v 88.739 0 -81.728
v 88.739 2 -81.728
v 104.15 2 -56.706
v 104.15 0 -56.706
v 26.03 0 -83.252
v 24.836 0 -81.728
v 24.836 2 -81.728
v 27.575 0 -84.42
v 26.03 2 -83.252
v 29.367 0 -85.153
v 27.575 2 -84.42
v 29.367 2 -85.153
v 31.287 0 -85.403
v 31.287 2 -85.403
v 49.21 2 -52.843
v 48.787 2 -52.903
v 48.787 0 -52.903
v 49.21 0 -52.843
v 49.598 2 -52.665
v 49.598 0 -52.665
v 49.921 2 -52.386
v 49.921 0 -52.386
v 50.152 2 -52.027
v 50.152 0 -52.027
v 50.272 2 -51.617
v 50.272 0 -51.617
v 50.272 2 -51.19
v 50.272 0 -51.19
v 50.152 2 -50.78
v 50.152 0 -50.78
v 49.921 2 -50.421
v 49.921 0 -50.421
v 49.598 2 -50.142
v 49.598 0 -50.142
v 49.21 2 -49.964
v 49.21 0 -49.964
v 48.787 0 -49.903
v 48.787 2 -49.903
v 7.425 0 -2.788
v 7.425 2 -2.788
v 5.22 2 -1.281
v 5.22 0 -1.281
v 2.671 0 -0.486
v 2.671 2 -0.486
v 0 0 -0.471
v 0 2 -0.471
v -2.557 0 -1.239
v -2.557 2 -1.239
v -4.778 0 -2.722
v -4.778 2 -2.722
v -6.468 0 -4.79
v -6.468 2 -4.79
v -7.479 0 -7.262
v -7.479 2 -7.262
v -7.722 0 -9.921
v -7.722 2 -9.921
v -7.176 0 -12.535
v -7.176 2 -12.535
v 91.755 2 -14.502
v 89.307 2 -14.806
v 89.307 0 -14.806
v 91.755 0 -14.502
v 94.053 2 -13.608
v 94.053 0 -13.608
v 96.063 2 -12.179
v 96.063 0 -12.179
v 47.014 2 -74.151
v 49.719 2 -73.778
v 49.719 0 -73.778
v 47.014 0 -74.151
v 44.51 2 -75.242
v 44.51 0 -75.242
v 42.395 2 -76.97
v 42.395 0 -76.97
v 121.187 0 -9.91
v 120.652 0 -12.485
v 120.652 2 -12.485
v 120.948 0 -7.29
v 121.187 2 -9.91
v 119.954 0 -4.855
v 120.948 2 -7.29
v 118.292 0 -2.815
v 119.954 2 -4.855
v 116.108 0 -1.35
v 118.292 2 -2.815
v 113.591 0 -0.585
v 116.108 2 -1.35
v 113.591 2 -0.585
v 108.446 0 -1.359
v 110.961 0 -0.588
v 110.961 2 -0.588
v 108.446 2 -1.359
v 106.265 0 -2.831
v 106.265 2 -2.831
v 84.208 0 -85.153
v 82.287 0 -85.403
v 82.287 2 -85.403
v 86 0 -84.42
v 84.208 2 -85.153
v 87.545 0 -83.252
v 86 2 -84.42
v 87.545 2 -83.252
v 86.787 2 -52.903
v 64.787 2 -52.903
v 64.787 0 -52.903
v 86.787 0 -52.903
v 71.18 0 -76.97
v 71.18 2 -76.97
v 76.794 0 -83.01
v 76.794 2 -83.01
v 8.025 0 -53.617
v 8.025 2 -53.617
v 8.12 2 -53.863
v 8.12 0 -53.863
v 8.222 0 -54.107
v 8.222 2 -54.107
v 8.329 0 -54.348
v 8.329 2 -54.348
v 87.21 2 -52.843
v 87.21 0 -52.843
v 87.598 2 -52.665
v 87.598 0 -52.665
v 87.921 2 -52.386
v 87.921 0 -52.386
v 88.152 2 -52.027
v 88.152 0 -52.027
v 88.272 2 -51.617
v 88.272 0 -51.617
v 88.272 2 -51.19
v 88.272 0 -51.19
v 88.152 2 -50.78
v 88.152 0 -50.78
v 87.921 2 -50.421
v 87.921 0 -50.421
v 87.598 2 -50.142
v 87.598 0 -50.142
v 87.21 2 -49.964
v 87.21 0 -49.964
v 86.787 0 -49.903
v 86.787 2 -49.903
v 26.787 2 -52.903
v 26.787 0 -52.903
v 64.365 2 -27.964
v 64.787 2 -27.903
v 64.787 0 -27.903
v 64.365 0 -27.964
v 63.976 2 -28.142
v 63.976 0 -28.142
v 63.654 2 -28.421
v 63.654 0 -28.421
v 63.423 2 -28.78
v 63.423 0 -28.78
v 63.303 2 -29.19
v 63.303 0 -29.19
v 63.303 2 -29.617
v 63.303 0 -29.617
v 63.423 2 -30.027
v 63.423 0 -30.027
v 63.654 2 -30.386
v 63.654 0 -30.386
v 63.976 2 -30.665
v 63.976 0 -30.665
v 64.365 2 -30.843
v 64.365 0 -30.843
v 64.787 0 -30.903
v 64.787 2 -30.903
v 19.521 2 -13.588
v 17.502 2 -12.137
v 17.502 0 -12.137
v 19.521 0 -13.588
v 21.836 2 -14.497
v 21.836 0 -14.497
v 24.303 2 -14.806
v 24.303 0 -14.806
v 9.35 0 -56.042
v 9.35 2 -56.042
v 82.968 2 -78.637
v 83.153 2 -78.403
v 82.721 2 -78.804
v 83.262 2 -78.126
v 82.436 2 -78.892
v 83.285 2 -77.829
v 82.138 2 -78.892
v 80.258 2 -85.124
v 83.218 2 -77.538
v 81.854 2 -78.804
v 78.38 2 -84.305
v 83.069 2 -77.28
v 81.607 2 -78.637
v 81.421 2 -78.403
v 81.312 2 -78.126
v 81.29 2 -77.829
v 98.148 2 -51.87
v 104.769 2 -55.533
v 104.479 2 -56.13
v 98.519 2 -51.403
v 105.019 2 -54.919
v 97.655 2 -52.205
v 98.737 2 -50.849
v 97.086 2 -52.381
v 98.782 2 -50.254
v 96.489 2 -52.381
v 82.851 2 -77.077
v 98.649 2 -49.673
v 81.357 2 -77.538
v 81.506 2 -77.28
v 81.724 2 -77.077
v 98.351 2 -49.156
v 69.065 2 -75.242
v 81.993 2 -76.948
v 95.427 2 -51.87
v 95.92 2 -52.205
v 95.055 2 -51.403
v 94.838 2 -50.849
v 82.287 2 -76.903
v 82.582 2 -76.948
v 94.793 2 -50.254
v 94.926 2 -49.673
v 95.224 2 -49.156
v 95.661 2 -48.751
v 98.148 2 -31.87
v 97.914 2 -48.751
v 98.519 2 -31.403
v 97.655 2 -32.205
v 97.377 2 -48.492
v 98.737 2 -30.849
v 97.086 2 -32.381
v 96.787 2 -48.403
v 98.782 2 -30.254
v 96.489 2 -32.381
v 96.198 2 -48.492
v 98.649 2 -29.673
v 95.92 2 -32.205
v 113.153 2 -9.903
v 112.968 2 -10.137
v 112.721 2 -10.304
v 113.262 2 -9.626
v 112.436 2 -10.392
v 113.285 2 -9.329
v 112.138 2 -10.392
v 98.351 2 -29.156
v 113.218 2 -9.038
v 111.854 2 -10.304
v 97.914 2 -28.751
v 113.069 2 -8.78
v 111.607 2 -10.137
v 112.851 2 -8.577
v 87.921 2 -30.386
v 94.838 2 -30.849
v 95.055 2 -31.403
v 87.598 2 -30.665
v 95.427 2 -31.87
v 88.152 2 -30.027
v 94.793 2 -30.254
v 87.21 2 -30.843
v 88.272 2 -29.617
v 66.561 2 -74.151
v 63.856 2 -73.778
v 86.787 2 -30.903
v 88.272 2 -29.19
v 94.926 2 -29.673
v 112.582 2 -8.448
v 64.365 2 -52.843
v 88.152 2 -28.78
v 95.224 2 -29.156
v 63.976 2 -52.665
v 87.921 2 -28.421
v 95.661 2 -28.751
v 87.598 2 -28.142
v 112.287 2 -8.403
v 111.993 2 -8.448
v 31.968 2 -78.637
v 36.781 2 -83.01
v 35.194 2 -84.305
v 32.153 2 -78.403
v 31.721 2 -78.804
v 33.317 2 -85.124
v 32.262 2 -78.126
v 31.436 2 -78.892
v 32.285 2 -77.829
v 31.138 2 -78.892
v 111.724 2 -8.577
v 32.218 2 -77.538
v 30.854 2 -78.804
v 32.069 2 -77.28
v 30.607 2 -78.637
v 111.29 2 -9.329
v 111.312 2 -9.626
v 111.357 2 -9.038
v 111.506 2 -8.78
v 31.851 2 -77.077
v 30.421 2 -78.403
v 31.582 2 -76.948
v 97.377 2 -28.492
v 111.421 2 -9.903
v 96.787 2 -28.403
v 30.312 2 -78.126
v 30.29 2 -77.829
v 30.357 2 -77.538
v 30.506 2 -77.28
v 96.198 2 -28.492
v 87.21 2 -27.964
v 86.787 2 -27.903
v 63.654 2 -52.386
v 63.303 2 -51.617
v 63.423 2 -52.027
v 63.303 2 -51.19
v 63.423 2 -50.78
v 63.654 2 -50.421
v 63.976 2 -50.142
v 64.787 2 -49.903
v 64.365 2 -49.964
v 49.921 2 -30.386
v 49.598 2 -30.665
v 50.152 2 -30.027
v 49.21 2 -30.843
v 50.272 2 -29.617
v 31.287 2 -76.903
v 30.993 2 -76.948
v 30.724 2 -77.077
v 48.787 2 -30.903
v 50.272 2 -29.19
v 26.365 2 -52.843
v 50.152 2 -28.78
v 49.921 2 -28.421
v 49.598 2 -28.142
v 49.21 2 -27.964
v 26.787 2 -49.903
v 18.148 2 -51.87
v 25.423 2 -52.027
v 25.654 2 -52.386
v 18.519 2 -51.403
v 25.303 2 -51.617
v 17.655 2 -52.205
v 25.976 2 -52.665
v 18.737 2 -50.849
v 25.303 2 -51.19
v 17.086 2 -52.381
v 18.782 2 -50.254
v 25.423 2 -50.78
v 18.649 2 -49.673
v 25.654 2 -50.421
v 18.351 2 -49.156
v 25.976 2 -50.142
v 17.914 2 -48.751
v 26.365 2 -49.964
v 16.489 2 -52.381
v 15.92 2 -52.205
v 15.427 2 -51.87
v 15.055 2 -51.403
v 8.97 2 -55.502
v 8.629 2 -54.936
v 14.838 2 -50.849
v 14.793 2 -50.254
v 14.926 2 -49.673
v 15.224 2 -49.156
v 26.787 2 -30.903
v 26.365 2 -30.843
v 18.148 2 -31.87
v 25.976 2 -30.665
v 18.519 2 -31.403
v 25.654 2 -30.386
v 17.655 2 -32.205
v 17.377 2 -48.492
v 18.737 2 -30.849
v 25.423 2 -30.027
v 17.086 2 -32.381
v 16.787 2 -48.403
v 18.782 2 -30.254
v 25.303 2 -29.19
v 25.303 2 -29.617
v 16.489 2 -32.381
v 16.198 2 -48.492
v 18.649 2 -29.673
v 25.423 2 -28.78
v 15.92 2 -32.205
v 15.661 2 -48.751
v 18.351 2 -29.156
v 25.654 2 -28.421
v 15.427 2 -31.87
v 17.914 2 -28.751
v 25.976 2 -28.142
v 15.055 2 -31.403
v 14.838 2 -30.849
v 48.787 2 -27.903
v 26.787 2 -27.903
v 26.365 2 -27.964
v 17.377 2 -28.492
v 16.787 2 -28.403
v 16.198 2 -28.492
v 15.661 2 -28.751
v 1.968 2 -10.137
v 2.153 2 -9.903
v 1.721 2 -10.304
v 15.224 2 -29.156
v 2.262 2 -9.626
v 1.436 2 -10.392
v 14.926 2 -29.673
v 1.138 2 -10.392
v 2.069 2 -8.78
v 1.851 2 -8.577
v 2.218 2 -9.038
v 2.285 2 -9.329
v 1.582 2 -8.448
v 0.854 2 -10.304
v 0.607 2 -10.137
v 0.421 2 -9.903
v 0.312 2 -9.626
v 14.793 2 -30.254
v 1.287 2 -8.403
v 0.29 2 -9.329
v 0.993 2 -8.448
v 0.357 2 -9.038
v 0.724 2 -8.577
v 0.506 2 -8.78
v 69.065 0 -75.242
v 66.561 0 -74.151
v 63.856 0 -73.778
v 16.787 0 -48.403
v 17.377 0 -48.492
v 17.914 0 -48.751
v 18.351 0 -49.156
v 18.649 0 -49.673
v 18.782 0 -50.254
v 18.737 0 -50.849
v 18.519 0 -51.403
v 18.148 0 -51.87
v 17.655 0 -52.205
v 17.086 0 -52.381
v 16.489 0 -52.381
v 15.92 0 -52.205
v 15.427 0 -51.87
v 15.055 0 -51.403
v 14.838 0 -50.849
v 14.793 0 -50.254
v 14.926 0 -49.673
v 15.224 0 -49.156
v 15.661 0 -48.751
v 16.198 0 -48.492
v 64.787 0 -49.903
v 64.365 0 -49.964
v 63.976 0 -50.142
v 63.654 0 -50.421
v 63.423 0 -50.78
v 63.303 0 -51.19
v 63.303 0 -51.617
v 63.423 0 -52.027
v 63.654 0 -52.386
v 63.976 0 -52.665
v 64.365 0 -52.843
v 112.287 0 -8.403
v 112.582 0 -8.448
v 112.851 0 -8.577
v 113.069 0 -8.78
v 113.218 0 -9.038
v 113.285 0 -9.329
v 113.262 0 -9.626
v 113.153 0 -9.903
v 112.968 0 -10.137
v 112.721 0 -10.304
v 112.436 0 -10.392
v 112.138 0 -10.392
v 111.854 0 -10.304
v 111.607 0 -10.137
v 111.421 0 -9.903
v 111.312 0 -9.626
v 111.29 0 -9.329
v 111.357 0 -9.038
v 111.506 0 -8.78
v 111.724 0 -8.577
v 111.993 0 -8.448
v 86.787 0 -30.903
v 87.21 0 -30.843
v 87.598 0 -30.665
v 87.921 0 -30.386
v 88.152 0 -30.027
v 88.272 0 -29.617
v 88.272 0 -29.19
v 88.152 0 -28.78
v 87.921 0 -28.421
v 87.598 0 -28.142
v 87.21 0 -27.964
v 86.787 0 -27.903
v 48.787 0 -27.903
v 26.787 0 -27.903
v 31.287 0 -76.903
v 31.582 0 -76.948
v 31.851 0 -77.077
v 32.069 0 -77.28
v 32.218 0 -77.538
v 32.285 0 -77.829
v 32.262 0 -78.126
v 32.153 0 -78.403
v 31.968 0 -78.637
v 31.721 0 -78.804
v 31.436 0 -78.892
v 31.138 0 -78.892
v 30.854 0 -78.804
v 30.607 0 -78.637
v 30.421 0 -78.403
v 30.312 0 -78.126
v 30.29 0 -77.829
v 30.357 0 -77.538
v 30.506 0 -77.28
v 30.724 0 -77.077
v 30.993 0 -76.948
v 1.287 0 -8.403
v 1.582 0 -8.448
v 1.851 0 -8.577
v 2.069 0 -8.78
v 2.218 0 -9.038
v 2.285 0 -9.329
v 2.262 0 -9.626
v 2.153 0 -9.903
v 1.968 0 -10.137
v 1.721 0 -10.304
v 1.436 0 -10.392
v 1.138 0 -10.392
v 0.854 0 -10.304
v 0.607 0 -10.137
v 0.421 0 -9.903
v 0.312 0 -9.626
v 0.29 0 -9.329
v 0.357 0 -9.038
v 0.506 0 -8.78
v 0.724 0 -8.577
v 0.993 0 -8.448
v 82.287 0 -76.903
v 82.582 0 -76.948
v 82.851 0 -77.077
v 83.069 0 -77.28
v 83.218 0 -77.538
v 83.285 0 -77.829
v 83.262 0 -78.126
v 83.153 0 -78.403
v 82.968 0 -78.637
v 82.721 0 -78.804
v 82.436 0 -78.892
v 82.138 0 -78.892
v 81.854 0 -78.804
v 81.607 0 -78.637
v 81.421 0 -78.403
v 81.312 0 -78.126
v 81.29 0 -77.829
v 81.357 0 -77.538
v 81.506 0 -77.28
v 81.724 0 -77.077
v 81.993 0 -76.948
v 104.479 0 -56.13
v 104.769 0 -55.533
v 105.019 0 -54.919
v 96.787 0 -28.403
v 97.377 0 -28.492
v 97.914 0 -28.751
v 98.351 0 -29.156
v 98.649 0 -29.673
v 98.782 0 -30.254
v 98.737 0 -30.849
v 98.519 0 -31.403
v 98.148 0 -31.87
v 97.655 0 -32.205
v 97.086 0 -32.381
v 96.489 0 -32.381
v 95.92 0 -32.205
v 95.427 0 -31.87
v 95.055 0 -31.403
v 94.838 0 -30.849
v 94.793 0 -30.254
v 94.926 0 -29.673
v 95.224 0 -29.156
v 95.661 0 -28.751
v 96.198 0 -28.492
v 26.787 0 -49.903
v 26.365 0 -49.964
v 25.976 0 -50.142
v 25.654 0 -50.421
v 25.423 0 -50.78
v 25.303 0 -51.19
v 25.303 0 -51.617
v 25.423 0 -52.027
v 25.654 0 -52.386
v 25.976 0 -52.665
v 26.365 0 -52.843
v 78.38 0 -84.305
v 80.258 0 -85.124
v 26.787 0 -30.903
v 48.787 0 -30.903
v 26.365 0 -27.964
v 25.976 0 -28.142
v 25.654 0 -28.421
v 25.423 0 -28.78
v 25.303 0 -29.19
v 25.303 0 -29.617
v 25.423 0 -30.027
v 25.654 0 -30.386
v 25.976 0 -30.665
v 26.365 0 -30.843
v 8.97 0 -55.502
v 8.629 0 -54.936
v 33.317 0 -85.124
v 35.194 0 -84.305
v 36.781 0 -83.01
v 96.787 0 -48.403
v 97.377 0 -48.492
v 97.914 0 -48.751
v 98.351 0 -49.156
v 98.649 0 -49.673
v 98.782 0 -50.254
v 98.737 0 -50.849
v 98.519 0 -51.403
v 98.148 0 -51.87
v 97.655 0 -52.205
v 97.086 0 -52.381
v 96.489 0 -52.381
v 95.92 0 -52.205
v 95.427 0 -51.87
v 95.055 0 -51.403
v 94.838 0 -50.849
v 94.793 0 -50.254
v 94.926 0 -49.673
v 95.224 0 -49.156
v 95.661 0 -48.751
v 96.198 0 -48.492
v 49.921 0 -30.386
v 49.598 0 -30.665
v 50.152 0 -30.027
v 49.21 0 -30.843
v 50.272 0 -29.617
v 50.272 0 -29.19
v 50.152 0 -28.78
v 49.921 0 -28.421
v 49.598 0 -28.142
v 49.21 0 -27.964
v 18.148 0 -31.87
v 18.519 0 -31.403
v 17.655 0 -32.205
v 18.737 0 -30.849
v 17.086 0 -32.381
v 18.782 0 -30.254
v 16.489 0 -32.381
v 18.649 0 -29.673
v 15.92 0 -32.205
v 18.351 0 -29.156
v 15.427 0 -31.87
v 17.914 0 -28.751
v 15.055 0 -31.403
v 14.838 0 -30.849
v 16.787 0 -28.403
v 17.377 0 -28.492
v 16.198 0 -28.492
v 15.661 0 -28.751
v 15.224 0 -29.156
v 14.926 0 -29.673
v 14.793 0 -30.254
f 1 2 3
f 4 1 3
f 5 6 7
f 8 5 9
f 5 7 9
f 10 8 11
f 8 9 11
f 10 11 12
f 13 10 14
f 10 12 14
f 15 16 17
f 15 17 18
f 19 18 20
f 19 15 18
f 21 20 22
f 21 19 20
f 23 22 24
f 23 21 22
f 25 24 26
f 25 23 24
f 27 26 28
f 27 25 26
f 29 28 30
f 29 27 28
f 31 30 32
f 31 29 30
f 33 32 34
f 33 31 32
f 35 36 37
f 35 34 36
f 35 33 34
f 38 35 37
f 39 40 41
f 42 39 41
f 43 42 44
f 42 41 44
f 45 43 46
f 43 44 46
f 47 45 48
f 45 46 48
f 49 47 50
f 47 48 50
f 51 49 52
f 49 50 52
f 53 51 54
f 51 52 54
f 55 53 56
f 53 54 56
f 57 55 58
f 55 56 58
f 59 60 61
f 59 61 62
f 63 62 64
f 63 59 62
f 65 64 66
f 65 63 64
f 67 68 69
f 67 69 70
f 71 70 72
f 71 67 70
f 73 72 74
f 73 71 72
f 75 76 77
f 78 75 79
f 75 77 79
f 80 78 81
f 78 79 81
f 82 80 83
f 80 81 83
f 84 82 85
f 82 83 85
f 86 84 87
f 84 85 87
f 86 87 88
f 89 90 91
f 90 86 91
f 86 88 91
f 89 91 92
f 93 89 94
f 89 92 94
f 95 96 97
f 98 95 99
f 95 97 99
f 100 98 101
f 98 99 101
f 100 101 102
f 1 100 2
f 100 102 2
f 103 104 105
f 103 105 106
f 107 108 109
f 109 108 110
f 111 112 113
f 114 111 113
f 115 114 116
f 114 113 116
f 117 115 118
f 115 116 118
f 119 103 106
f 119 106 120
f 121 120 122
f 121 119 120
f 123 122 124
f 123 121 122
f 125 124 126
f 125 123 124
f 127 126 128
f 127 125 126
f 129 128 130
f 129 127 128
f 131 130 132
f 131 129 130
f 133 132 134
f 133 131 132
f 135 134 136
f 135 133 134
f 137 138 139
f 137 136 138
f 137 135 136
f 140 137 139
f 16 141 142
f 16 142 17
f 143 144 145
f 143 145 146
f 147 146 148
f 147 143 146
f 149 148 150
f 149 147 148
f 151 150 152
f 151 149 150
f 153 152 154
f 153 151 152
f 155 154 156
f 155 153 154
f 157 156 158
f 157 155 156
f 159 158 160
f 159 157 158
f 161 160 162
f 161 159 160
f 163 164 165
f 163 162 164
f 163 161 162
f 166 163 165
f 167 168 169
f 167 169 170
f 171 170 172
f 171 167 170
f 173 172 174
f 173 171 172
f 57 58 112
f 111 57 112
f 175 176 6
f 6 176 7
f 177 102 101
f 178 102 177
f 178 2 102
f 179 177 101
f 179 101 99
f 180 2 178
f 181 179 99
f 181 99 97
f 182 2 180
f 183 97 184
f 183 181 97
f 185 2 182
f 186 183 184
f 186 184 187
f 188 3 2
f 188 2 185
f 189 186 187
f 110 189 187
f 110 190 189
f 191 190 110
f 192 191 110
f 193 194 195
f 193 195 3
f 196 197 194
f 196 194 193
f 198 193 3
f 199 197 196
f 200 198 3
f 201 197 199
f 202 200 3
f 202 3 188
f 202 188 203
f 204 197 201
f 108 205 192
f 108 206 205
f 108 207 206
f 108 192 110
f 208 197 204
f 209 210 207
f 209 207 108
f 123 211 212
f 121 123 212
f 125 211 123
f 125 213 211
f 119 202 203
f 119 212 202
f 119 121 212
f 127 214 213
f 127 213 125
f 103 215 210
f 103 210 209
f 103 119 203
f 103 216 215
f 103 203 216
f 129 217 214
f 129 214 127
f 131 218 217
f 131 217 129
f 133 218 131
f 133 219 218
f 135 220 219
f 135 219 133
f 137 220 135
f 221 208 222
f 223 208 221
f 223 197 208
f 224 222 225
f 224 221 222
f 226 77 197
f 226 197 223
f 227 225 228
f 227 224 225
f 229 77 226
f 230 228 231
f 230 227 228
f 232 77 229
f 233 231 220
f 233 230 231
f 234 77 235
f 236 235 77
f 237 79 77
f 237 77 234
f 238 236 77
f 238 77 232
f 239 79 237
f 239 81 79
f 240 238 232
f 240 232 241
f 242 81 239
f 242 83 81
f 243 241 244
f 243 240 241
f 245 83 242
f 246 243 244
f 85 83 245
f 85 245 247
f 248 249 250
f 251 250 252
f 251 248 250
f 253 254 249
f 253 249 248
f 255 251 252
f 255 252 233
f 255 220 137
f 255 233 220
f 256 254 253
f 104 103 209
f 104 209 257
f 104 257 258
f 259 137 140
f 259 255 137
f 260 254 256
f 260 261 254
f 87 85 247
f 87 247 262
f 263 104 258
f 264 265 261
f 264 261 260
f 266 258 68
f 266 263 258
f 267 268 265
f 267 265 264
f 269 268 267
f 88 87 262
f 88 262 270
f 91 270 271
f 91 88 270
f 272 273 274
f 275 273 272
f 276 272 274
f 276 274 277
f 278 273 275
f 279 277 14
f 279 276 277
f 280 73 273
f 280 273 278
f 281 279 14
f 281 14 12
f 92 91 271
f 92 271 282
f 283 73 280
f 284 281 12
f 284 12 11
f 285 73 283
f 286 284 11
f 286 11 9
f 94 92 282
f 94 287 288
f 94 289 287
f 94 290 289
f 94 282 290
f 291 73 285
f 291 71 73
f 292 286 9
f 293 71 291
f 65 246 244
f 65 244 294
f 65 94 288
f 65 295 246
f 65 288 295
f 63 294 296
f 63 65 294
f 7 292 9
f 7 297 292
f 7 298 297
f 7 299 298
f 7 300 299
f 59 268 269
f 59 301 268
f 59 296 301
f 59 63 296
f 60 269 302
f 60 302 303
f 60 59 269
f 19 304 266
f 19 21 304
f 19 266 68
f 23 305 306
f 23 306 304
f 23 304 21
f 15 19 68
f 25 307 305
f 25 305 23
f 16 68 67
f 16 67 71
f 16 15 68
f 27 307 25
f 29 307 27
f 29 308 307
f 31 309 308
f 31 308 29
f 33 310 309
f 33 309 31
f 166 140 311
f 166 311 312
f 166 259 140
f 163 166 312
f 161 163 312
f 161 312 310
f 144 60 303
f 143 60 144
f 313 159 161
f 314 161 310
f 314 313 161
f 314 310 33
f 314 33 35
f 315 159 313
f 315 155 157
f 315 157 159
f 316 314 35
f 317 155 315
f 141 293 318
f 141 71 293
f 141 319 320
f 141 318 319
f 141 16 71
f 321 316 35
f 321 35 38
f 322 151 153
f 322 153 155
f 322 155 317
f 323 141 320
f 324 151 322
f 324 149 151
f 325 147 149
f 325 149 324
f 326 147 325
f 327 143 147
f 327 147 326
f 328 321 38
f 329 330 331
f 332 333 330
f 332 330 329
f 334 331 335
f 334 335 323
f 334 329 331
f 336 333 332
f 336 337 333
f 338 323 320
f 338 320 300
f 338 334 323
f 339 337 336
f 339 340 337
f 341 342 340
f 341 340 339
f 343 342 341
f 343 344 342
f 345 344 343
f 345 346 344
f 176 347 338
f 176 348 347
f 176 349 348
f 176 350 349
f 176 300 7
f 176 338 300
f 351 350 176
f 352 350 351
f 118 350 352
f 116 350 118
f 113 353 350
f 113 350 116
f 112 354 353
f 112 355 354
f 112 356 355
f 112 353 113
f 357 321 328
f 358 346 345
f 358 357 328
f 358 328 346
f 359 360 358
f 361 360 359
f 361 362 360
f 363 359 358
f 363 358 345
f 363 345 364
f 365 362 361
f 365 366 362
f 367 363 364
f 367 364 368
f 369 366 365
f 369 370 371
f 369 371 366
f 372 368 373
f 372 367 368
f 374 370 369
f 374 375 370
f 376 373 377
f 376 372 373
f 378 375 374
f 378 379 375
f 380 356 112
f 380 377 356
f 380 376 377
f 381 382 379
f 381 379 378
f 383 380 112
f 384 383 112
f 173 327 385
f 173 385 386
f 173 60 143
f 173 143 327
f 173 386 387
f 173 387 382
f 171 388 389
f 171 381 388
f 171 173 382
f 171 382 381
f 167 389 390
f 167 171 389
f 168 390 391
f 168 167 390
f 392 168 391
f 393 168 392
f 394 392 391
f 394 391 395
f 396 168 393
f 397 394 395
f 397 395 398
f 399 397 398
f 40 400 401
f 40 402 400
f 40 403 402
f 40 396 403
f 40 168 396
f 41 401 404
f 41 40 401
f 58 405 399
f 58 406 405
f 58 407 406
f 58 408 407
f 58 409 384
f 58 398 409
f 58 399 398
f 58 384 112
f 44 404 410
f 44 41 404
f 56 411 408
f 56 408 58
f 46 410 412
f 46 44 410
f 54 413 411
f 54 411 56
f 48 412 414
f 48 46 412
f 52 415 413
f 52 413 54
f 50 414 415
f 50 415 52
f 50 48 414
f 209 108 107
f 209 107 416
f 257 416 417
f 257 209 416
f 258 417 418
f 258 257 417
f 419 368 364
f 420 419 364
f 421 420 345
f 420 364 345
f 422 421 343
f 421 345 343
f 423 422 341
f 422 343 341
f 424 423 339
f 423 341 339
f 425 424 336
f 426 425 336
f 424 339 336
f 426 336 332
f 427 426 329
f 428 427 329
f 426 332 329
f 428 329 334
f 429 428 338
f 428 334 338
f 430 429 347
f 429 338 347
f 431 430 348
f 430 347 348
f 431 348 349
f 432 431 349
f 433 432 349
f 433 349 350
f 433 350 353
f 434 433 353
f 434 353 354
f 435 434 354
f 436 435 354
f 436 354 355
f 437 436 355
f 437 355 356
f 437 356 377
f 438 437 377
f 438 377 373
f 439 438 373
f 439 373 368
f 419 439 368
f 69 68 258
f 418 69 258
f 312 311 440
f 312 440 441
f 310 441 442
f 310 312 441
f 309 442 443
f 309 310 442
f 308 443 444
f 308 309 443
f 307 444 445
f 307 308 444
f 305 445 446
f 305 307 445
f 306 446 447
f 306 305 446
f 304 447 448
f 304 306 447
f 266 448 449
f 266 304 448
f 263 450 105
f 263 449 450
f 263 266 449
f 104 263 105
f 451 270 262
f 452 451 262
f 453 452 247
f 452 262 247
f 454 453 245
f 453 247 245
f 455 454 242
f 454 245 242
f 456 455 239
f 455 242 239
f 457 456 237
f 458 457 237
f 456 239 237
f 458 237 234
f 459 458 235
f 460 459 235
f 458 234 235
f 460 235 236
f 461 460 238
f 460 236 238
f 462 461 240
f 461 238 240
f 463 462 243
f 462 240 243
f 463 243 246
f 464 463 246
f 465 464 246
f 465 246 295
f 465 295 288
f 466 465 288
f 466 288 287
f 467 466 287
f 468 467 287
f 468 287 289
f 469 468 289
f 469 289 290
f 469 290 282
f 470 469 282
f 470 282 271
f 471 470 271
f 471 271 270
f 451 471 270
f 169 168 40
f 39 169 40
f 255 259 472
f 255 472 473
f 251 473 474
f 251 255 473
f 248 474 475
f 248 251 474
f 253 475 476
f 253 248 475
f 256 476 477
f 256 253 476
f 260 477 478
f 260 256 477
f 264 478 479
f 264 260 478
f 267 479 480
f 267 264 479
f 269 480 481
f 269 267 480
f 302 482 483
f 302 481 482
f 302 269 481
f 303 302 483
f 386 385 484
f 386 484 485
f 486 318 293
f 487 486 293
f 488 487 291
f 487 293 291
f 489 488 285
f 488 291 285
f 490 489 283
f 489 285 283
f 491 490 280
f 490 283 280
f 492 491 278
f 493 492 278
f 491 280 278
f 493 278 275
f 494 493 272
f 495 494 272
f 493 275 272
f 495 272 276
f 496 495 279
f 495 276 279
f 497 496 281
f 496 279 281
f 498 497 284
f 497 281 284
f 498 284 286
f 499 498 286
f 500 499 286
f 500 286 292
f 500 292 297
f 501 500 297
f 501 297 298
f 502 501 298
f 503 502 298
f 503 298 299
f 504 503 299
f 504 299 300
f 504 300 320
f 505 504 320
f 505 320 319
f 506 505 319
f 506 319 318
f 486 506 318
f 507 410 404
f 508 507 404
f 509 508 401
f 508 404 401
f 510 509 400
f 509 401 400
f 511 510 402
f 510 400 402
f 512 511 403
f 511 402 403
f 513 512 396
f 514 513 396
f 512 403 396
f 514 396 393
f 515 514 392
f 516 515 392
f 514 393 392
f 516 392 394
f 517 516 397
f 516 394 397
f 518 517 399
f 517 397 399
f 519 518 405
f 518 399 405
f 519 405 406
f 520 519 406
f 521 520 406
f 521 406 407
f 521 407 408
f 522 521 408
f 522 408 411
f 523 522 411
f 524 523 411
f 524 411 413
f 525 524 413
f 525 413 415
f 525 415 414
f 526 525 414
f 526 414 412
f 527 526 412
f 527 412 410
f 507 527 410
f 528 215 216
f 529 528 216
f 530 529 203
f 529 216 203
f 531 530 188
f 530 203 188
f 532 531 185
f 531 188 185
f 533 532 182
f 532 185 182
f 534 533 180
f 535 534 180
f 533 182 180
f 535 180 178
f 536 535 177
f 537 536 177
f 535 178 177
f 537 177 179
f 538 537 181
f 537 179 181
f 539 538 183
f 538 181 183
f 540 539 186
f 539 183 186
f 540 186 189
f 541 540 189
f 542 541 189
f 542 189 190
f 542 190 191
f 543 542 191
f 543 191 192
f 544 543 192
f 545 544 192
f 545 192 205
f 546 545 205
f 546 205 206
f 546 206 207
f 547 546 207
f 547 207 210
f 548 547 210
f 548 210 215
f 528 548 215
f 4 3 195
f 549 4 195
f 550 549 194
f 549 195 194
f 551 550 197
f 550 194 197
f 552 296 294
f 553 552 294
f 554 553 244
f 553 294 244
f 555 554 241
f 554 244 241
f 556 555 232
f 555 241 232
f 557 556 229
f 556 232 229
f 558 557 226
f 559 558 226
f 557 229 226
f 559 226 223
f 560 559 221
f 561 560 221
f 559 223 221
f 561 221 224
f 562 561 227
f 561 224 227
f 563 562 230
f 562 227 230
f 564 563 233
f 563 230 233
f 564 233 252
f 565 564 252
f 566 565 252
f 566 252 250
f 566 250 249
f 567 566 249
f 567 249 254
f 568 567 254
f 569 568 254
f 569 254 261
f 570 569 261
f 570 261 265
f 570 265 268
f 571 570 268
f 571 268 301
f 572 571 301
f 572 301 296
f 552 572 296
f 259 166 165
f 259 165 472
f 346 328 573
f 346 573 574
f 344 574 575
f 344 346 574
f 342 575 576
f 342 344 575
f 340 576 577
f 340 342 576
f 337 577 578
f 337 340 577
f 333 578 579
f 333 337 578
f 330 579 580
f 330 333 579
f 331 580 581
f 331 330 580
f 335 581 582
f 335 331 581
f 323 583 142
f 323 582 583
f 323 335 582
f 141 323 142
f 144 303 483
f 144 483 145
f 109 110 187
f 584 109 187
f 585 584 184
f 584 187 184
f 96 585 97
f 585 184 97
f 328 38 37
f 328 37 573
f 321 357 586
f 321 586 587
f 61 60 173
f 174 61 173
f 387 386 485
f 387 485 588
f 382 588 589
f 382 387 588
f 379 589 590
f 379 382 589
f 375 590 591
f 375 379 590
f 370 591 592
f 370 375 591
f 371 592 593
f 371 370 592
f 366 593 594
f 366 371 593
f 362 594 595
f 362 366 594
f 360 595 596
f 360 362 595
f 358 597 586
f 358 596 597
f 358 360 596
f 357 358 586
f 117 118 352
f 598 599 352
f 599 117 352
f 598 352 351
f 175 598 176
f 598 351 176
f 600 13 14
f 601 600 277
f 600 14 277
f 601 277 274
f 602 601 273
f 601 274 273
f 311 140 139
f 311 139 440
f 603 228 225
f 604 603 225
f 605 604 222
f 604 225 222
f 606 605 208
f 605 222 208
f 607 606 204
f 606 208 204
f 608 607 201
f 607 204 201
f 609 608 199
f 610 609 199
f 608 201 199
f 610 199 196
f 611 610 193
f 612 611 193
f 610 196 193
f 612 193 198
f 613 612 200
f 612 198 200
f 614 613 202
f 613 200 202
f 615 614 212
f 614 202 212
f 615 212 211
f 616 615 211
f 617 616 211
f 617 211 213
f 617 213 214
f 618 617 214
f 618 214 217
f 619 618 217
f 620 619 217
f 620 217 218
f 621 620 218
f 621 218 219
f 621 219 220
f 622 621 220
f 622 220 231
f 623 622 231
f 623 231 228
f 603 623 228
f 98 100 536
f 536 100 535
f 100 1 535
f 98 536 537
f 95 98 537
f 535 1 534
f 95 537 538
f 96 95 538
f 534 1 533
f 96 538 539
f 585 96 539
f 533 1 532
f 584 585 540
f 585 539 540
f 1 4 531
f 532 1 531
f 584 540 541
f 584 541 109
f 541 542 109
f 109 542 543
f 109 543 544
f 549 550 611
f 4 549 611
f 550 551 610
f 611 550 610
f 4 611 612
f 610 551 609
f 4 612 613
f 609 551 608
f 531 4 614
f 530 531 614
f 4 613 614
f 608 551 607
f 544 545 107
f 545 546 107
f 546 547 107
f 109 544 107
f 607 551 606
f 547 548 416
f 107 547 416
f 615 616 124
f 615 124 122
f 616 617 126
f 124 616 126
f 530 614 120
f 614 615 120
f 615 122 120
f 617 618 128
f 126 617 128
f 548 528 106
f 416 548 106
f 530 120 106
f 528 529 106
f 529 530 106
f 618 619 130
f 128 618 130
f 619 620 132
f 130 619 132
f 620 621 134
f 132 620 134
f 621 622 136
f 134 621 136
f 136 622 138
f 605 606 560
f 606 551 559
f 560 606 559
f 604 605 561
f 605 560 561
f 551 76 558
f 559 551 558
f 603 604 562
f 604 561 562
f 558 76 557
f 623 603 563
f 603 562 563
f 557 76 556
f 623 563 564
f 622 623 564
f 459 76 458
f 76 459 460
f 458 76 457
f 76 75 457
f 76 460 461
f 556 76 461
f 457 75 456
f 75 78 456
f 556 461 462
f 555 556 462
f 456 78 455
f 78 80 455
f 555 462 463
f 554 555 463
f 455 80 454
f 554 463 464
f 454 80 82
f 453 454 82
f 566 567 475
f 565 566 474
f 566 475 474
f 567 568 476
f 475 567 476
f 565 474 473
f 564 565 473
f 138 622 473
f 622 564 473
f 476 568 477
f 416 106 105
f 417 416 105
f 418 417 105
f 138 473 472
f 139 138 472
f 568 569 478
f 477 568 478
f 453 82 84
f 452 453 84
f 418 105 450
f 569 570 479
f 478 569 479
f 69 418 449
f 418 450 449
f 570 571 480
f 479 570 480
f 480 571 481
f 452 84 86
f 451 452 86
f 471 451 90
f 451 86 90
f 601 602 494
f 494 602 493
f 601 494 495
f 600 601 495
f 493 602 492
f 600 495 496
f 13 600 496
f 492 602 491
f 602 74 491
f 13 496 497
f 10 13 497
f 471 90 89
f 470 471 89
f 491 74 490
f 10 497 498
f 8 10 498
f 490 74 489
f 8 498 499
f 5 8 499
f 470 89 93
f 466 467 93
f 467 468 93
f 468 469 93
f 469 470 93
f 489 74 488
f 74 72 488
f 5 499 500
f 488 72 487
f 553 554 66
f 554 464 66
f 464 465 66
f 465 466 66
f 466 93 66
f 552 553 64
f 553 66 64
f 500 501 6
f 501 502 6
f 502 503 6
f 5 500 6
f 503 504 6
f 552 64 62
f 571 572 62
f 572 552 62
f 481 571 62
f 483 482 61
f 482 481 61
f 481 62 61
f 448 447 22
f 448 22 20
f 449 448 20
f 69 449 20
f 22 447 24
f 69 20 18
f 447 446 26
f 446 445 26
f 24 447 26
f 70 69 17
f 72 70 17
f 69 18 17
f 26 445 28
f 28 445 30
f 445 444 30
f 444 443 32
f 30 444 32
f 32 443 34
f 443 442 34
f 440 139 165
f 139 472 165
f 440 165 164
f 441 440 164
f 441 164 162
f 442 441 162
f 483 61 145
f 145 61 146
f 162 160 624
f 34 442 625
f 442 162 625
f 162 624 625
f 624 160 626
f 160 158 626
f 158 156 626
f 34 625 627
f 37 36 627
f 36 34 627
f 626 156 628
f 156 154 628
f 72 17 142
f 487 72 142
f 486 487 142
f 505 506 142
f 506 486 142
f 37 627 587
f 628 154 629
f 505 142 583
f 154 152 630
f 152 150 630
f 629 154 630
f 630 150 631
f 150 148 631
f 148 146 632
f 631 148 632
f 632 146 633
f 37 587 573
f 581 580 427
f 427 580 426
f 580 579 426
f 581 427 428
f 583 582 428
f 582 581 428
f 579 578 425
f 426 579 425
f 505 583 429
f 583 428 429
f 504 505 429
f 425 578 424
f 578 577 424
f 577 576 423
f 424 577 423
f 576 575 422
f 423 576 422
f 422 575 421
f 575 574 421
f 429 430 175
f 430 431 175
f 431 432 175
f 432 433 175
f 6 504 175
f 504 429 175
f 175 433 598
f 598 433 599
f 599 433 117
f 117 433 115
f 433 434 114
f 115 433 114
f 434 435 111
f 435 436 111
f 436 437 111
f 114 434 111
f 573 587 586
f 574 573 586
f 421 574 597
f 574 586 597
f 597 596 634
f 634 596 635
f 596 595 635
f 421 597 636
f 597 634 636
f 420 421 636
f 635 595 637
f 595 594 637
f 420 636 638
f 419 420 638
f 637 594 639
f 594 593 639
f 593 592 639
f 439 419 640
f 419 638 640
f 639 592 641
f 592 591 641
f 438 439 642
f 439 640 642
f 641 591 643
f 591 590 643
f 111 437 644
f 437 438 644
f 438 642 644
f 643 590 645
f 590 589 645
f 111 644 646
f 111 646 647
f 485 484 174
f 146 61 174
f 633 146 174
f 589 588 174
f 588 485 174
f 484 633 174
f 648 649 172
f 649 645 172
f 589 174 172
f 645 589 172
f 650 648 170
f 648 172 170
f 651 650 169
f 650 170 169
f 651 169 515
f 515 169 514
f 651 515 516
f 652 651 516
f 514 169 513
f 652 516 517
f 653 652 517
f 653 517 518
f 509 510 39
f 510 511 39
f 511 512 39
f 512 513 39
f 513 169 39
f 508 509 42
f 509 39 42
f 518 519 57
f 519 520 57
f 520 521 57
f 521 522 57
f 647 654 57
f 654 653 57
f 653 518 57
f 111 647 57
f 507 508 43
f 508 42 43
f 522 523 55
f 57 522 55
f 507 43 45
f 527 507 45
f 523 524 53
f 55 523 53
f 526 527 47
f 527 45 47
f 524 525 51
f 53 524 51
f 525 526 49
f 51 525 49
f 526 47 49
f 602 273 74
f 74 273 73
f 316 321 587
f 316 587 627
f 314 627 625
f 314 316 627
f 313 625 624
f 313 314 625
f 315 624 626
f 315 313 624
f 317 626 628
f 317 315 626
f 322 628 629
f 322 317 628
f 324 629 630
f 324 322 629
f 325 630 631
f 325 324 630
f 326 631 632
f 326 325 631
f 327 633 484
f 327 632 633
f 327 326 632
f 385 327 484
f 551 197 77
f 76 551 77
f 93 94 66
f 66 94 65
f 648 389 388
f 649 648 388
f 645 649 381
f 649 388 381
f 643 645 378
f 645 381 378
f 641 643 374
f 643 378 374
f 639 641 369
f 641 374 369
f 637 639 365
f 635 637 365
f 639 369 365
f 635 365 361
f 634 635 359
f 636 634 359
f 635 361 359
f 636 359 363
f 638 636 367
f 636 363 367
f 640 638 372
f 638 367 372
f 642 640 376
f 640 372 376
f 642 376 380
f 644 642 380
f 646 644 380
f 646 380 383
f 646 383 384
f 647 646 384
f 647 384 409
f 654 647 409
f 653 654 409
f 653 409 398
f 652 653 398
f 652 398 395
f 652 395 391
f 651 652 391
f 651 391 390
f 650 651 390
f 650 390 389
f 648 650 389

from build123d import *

# Parameters (mm, degrees)
SKETCH1_W           = 130
SKETCH1_H           = 90
BOSS_EXTRUDE2_DEPTH = 2
SKETCH2_R           = 2
CUT_EXTRUDE1_DEPTH  = 10
CUT_EXTRUDE3_DEPTH  = 10
SKETCH5_R           = 1
CUT_EXTRUDE4_DEPTH  = 10
CUT_EXTRUDE5_DEPTH  = 149.761308663
FILLET1_R           = 10


with BuildPart() as part:
    # Sketch1 → Boss-Extrude2 (new body)
    with BuildSketch(Plane(origin=(0, 0, 0), x_dir=(1, 0, 0), z_dir=(0, 1, 0))):
        with Locations((56.787418592, 40.403463793)):
            Rectangle(SKETCH1_W, SKETCH1_H)
    extrude(amount=BOSS_EXTRUDE2_DEPTH)

    # Sketch2 → Cut-Extrude1 (cut)
    with BuildSketch(Plane(origin=(0, 2, 0), x_dir=(1, 0, 0), z_dir=(0, 1, 0))):
        with Locations(Location((16.787418592, 50.403463793, 0), (0, 0, 270))):
            Circle(SKETCH2_R)
        with Locations(Location((16.787418592, 30.403463793, 0), (0, 0, 270))):
            Circle(SKETCH2_R)
        with Locations(Location((96.787418592, 50.403463793, 0), (0, 0, 270))):
            Circle(SKETCH2_R)
        with Locations(Location((96.787418592, 30.403463793, 0), (0, 0, 270))):
            Circle(SKETCH2_R)
    extrude(amount=-CUT_EXTRUDE1_DEPTH, mode=Mode.SUBTRACT)

    # Sketch4 → Cut-Extrude3 (cut)
    with BuildSketch(Plane(origin=(0, 2, 0), x_dir=(1, 0, 0), z_dir=(0, 1, 0))):
        with BuildLine():
            Line((26.787418592, 52.903463793), (48.787418592, 52.903463793))
            ThreePointArc((48.787418592, 52.903463793), (50.287418592, 51.403463793), (48.787418592, 49.903463793))
            Line((48.787418592, 49.903463793), (26.787418592, 49.903463793))
            ThreePointArc((26.787418592, 49.903463793), (25.287418592, 51.403463793), (26.787418592, 52.903463793))
        make_face()
        with BuildLine():
            Line((26.787418592, 30.903463793), (48.787418592, 30.903463793))
            ThreePointArc((48.787418592, 30.903463793), (50.287418592, 29.403463793), (48.787418592, 27.903463793))
            Line((48.787418592, 27.903463793), (26.787418592, 27.903463793))
            ThreePointArc((26.787418592, 27.903463793), (25.287418592, 29.403463793), (26.787418592, 30.903463793))
        make_face()
        with BuildLine():
            Line((64.787418592, 52.903463793), (86.787418592, 52.903463793))
            ThreePointArc((86.787418592, 52.903463793), (88.287418592, 51.403463793), (86.787418592, 49.903463793))
            Line((86.787418592, 49.903463793), (64.787418592, 49.903463793))
            ThreePointArc((64.787418592, 49.903463793), (63.287418592, 51.403463793), (64.787418592, 52.903463793))
        make_face()
        with BuildLine():
            Line((64.787418592, 30.903463793), (86.787418592, 30.903463793))
            ThreePointArc((86.787418592, 30.903463793), (88.287418592, 29.403463793), (86.787418592, 27.903463793))
            Line((86.787418592, 27.903463793), (64.787418592, 27.903463793))
            ThreePointArc((64.787418592, 27.903463793), (63.287418592, 29.403463793), (64.787418592, 30.903463793))
        make_face()
    extrude(amount=-CUT_EXTRUDE3_DEPTH, mode=Mode.SUBTRACT)

    # Sketch5 → Cut-Extrude4 (cut)
    with BuildSketch(Plane(origin=(0, 2, 0), x_dir=(1, 0, 0), z_dir=(0, 1, 0))):
        with Locations(Location((1.287418592, 9.403463793, 0), (0, 0, 270))):
            Circle(SKETCH5_R)
        with Locations(Location((112.287418592, 9.403463793, 0), (0, 0, 270))):
            Circle(SKETCH5_R)
        with Locations(Location((31.287418592, 77.903463793, 0), (0, 0, 270))):
            Circle(SKETCH5_R)
        with Locations(Location((82.287418592, 77.903463793, 0), (0, 0, 270))):
            Circle(SKETCH5_R)
    extrude(amount=-CUT_EXTRUDE4_DEPTH, mode=Mode.SUBTRACT)

    # Sketch6 → Cut-Extrude5 (cut, through all)
    with BuildSketch(Plane(origin=(0, 2, 0), x_dir=(1, 0, 0), z_dir=(0, 1, 0))):
        with BuildLine():
            Line((31.28741871, 85.403463793), (-8.212581408, 85.403463793))
            Line((-8.212581408, 85.403463793), (-8.212581408, -4.596536207))
            Line((-8.212581408, -4.596536207), (121.787418592, -4.596536207))
            Line((121.787418592, -4.596536207), (121.787418592, 85.403463793))
            Line((121.787418592, 85.403463793), (82.287418592, 85.403463793))
            ThreePointArc((82.287418592, 85.403463793), (86.000200188, 84.420000667), (88.739279438, 81.727531213))
            Line((88.739279438, 81.727531213), (104.673461226, 55.855633786))
            Line((104.673461226, 55.855633786), (120.652052787, 12.485170978))
            ThreePointArc((120.652052787, 12.485170978), (117.254615907, 2.001371169), (106.265325845, 2.830913046))
            Line((106.265325845, 2.830913046), (93.195977552, 14.805689748))
            Line((93.195977552, 14.805689748), (20.378859632, 14.805689748))
            Line((20.378859632, 14.805689748), (7.425097101, 2.787815466))
            ThreePointArc((7.425097103, 2.787815464), (-3.723088928, 1.897951505), (-7.176040156, 12.53519915))
            Line((-7.176040154, 12.53519915), (8.242814409, 54.204377623))
            Line((8.242814409, 54.204377623), (8.329286173, 54.347812353))
            ThreePointArc((8.329286173, 54.347812353), (8.794878375, 55.221885781), (9.350471922, 56.041700557))
            Line((9.350471922, 56.041700557), (24.835557745, 81.727531213))
            ThreePointArc((24.835557746, 81.727531212), (27.574637047, 84.420000696), (31.28741871, 85.403463793))
        make_face()
        with BuildLine():
            Line((82.287418592, 85.403463793), (31.28741871, 85.403463793))
            ThreePointArc((31.28741871, 85.403463793), (34.283566781, 84.779007119), (36.780790962, 83.00962282))
            Line((36.780790963, 83.009622821), (45.361476392, 73.77824166))
            Line((45.361476392, 73.77824166), (68.213360792, 73.77824166))
            Line((68.213360792, 73.77824166), (76.794046223, 83.009622821))
            ThreePointArc((76.794046223, 83.009622821), (79.291270457, 84.779007143), (82.287418592, 85.403463793))
        make_face()
    extrude(amount=-CUT_EXTRUDE5_DEPTH, mode=Mode.SUBTRACT)

    # Fillet1
    # the kernel refuses this fillet: 10 mm, written as the material it adds along each edge
    with BuildSketch(Plane(origin=(45.361476392, 2, -73.77824166), x_dir=(1, 0, 0), z_dir=(0, -1, 0))) as fillet1_piece_1:
        with BuildLine():
            CenterArc((FILLET1_R * 0.435768925154, -FILLET1_R), FILLET1_R, 90, 47.092151835)
            Line((-FILLET1_R * 0.296680724118, -FILLET1_R * 0.319178796393), (0, 0))
            Line((0, 0), (FILLET1_R * 0.435768925154, 0))
        make_face()
    extrude(amount=2)
    with BuildSketch(Plane(origin=(68.213360792, 2, -73.77824166), x_dir=(-1, 0, 0), z_dir=(0, -1, 0))) as fillet1_piece_2:
        with BuildLine():
            CenterArc((FILLET1_R * 0.435768925095, FILLET1_R), FILLET1_R, 222.907848171, 47.092151829)
            Line((-FILLET1_R * 0.296680724109, FILLET1_R * 0.31917879632), (0, 0))
            Line((0, 0), (FILLET1_R * 0.435768925095, 0))
        make_face()
    extrude(amount=2)
    with BuildSketch(Plane(origin=(93.195977552, 2, -14.805689748), x_dir=(0.7373075314629184, 0, 0.6755572544559473), z_dir=(0, -1, 0))) as fillet1_piece_3:
        with BuildLine():
            CenterArc((FILLET1_R * 0.388853005137, FILLET1_R), FILLET1_R, 227.502560825, 42.497439175)
            Line((-FILLET1_R * 0.286704249319, FILLET1_R * 0.262692468537), (0, 0))
            Line((0, 0), (FILLET1_R * 0.388853005137, 0))
        make_face()
    extrude(amount=2)
    with BuildSketch(Plane(origin=(20.378859632, 2, -14.805689748), x_dir=(1, 0, 0), z_dir=(0, -1, 0))) as fillet1_piece_4:
        with BuildLine():
            CenterArc((FILLET1_R * 0.392436109253, FILLET1_R), FILLET1_R, 227.146329541, 42.853670459)
            Line((-FILLET1_R * 0.287692200824, FILLET1_R * 0.2669069078), (0, 0))
            Line((0, 0), (FILLET1_R * 0.392436109253, 0))
        make_face()
    extrude(amount=2)
    # the kernel refuses this fillet: 10 mm, written as the material it takes off along each edge
    with BuildSketch(Plane(origin=(104.673461226, 4.496112329, -55.855633786), x_dir=(0.3457053588273583, 0, 0.9383431168171094), z_dir=(0, -1, 0))) as fillet1_2_piece_1:
        with BuildLine():
            CenterArc((FILLET1_R * 0.0998444931431, FILLET1_R), FILLET1_R, 258.596457336, 11.403542664)
            Line((-FILLET1_R * 0.0978734581483, FILLET1_R * 0.019741048632), (0, 0))
            Line((0, 0), (FILLET1_R * 0.0998444931431, 0))
        make_face()
    extrude(amount=6.992224657, mode=Mode.SUBTRACT)
    with BuildSketch(Plane(origin=(8.242814409, 3.565796653, -54.204377623), x_dir=(0.516298681525034, 0, -0.8564085890832199), z_dir=(0, -1, 0))) as fillet1_2_piece_2:
        with BuildLine():
            CenterArc((1.254824259, 9.940708785), FILLET1_R, 259.221695576, 4.53596152)
            Line((-0.615269231, 0.117127445), (0, 0))
            Line((0, 0), (0.167483992, 0))
        make_face()
    extrude(amount=5.131593306, mode=Mode.SUBTRACT)


solid = part.part
